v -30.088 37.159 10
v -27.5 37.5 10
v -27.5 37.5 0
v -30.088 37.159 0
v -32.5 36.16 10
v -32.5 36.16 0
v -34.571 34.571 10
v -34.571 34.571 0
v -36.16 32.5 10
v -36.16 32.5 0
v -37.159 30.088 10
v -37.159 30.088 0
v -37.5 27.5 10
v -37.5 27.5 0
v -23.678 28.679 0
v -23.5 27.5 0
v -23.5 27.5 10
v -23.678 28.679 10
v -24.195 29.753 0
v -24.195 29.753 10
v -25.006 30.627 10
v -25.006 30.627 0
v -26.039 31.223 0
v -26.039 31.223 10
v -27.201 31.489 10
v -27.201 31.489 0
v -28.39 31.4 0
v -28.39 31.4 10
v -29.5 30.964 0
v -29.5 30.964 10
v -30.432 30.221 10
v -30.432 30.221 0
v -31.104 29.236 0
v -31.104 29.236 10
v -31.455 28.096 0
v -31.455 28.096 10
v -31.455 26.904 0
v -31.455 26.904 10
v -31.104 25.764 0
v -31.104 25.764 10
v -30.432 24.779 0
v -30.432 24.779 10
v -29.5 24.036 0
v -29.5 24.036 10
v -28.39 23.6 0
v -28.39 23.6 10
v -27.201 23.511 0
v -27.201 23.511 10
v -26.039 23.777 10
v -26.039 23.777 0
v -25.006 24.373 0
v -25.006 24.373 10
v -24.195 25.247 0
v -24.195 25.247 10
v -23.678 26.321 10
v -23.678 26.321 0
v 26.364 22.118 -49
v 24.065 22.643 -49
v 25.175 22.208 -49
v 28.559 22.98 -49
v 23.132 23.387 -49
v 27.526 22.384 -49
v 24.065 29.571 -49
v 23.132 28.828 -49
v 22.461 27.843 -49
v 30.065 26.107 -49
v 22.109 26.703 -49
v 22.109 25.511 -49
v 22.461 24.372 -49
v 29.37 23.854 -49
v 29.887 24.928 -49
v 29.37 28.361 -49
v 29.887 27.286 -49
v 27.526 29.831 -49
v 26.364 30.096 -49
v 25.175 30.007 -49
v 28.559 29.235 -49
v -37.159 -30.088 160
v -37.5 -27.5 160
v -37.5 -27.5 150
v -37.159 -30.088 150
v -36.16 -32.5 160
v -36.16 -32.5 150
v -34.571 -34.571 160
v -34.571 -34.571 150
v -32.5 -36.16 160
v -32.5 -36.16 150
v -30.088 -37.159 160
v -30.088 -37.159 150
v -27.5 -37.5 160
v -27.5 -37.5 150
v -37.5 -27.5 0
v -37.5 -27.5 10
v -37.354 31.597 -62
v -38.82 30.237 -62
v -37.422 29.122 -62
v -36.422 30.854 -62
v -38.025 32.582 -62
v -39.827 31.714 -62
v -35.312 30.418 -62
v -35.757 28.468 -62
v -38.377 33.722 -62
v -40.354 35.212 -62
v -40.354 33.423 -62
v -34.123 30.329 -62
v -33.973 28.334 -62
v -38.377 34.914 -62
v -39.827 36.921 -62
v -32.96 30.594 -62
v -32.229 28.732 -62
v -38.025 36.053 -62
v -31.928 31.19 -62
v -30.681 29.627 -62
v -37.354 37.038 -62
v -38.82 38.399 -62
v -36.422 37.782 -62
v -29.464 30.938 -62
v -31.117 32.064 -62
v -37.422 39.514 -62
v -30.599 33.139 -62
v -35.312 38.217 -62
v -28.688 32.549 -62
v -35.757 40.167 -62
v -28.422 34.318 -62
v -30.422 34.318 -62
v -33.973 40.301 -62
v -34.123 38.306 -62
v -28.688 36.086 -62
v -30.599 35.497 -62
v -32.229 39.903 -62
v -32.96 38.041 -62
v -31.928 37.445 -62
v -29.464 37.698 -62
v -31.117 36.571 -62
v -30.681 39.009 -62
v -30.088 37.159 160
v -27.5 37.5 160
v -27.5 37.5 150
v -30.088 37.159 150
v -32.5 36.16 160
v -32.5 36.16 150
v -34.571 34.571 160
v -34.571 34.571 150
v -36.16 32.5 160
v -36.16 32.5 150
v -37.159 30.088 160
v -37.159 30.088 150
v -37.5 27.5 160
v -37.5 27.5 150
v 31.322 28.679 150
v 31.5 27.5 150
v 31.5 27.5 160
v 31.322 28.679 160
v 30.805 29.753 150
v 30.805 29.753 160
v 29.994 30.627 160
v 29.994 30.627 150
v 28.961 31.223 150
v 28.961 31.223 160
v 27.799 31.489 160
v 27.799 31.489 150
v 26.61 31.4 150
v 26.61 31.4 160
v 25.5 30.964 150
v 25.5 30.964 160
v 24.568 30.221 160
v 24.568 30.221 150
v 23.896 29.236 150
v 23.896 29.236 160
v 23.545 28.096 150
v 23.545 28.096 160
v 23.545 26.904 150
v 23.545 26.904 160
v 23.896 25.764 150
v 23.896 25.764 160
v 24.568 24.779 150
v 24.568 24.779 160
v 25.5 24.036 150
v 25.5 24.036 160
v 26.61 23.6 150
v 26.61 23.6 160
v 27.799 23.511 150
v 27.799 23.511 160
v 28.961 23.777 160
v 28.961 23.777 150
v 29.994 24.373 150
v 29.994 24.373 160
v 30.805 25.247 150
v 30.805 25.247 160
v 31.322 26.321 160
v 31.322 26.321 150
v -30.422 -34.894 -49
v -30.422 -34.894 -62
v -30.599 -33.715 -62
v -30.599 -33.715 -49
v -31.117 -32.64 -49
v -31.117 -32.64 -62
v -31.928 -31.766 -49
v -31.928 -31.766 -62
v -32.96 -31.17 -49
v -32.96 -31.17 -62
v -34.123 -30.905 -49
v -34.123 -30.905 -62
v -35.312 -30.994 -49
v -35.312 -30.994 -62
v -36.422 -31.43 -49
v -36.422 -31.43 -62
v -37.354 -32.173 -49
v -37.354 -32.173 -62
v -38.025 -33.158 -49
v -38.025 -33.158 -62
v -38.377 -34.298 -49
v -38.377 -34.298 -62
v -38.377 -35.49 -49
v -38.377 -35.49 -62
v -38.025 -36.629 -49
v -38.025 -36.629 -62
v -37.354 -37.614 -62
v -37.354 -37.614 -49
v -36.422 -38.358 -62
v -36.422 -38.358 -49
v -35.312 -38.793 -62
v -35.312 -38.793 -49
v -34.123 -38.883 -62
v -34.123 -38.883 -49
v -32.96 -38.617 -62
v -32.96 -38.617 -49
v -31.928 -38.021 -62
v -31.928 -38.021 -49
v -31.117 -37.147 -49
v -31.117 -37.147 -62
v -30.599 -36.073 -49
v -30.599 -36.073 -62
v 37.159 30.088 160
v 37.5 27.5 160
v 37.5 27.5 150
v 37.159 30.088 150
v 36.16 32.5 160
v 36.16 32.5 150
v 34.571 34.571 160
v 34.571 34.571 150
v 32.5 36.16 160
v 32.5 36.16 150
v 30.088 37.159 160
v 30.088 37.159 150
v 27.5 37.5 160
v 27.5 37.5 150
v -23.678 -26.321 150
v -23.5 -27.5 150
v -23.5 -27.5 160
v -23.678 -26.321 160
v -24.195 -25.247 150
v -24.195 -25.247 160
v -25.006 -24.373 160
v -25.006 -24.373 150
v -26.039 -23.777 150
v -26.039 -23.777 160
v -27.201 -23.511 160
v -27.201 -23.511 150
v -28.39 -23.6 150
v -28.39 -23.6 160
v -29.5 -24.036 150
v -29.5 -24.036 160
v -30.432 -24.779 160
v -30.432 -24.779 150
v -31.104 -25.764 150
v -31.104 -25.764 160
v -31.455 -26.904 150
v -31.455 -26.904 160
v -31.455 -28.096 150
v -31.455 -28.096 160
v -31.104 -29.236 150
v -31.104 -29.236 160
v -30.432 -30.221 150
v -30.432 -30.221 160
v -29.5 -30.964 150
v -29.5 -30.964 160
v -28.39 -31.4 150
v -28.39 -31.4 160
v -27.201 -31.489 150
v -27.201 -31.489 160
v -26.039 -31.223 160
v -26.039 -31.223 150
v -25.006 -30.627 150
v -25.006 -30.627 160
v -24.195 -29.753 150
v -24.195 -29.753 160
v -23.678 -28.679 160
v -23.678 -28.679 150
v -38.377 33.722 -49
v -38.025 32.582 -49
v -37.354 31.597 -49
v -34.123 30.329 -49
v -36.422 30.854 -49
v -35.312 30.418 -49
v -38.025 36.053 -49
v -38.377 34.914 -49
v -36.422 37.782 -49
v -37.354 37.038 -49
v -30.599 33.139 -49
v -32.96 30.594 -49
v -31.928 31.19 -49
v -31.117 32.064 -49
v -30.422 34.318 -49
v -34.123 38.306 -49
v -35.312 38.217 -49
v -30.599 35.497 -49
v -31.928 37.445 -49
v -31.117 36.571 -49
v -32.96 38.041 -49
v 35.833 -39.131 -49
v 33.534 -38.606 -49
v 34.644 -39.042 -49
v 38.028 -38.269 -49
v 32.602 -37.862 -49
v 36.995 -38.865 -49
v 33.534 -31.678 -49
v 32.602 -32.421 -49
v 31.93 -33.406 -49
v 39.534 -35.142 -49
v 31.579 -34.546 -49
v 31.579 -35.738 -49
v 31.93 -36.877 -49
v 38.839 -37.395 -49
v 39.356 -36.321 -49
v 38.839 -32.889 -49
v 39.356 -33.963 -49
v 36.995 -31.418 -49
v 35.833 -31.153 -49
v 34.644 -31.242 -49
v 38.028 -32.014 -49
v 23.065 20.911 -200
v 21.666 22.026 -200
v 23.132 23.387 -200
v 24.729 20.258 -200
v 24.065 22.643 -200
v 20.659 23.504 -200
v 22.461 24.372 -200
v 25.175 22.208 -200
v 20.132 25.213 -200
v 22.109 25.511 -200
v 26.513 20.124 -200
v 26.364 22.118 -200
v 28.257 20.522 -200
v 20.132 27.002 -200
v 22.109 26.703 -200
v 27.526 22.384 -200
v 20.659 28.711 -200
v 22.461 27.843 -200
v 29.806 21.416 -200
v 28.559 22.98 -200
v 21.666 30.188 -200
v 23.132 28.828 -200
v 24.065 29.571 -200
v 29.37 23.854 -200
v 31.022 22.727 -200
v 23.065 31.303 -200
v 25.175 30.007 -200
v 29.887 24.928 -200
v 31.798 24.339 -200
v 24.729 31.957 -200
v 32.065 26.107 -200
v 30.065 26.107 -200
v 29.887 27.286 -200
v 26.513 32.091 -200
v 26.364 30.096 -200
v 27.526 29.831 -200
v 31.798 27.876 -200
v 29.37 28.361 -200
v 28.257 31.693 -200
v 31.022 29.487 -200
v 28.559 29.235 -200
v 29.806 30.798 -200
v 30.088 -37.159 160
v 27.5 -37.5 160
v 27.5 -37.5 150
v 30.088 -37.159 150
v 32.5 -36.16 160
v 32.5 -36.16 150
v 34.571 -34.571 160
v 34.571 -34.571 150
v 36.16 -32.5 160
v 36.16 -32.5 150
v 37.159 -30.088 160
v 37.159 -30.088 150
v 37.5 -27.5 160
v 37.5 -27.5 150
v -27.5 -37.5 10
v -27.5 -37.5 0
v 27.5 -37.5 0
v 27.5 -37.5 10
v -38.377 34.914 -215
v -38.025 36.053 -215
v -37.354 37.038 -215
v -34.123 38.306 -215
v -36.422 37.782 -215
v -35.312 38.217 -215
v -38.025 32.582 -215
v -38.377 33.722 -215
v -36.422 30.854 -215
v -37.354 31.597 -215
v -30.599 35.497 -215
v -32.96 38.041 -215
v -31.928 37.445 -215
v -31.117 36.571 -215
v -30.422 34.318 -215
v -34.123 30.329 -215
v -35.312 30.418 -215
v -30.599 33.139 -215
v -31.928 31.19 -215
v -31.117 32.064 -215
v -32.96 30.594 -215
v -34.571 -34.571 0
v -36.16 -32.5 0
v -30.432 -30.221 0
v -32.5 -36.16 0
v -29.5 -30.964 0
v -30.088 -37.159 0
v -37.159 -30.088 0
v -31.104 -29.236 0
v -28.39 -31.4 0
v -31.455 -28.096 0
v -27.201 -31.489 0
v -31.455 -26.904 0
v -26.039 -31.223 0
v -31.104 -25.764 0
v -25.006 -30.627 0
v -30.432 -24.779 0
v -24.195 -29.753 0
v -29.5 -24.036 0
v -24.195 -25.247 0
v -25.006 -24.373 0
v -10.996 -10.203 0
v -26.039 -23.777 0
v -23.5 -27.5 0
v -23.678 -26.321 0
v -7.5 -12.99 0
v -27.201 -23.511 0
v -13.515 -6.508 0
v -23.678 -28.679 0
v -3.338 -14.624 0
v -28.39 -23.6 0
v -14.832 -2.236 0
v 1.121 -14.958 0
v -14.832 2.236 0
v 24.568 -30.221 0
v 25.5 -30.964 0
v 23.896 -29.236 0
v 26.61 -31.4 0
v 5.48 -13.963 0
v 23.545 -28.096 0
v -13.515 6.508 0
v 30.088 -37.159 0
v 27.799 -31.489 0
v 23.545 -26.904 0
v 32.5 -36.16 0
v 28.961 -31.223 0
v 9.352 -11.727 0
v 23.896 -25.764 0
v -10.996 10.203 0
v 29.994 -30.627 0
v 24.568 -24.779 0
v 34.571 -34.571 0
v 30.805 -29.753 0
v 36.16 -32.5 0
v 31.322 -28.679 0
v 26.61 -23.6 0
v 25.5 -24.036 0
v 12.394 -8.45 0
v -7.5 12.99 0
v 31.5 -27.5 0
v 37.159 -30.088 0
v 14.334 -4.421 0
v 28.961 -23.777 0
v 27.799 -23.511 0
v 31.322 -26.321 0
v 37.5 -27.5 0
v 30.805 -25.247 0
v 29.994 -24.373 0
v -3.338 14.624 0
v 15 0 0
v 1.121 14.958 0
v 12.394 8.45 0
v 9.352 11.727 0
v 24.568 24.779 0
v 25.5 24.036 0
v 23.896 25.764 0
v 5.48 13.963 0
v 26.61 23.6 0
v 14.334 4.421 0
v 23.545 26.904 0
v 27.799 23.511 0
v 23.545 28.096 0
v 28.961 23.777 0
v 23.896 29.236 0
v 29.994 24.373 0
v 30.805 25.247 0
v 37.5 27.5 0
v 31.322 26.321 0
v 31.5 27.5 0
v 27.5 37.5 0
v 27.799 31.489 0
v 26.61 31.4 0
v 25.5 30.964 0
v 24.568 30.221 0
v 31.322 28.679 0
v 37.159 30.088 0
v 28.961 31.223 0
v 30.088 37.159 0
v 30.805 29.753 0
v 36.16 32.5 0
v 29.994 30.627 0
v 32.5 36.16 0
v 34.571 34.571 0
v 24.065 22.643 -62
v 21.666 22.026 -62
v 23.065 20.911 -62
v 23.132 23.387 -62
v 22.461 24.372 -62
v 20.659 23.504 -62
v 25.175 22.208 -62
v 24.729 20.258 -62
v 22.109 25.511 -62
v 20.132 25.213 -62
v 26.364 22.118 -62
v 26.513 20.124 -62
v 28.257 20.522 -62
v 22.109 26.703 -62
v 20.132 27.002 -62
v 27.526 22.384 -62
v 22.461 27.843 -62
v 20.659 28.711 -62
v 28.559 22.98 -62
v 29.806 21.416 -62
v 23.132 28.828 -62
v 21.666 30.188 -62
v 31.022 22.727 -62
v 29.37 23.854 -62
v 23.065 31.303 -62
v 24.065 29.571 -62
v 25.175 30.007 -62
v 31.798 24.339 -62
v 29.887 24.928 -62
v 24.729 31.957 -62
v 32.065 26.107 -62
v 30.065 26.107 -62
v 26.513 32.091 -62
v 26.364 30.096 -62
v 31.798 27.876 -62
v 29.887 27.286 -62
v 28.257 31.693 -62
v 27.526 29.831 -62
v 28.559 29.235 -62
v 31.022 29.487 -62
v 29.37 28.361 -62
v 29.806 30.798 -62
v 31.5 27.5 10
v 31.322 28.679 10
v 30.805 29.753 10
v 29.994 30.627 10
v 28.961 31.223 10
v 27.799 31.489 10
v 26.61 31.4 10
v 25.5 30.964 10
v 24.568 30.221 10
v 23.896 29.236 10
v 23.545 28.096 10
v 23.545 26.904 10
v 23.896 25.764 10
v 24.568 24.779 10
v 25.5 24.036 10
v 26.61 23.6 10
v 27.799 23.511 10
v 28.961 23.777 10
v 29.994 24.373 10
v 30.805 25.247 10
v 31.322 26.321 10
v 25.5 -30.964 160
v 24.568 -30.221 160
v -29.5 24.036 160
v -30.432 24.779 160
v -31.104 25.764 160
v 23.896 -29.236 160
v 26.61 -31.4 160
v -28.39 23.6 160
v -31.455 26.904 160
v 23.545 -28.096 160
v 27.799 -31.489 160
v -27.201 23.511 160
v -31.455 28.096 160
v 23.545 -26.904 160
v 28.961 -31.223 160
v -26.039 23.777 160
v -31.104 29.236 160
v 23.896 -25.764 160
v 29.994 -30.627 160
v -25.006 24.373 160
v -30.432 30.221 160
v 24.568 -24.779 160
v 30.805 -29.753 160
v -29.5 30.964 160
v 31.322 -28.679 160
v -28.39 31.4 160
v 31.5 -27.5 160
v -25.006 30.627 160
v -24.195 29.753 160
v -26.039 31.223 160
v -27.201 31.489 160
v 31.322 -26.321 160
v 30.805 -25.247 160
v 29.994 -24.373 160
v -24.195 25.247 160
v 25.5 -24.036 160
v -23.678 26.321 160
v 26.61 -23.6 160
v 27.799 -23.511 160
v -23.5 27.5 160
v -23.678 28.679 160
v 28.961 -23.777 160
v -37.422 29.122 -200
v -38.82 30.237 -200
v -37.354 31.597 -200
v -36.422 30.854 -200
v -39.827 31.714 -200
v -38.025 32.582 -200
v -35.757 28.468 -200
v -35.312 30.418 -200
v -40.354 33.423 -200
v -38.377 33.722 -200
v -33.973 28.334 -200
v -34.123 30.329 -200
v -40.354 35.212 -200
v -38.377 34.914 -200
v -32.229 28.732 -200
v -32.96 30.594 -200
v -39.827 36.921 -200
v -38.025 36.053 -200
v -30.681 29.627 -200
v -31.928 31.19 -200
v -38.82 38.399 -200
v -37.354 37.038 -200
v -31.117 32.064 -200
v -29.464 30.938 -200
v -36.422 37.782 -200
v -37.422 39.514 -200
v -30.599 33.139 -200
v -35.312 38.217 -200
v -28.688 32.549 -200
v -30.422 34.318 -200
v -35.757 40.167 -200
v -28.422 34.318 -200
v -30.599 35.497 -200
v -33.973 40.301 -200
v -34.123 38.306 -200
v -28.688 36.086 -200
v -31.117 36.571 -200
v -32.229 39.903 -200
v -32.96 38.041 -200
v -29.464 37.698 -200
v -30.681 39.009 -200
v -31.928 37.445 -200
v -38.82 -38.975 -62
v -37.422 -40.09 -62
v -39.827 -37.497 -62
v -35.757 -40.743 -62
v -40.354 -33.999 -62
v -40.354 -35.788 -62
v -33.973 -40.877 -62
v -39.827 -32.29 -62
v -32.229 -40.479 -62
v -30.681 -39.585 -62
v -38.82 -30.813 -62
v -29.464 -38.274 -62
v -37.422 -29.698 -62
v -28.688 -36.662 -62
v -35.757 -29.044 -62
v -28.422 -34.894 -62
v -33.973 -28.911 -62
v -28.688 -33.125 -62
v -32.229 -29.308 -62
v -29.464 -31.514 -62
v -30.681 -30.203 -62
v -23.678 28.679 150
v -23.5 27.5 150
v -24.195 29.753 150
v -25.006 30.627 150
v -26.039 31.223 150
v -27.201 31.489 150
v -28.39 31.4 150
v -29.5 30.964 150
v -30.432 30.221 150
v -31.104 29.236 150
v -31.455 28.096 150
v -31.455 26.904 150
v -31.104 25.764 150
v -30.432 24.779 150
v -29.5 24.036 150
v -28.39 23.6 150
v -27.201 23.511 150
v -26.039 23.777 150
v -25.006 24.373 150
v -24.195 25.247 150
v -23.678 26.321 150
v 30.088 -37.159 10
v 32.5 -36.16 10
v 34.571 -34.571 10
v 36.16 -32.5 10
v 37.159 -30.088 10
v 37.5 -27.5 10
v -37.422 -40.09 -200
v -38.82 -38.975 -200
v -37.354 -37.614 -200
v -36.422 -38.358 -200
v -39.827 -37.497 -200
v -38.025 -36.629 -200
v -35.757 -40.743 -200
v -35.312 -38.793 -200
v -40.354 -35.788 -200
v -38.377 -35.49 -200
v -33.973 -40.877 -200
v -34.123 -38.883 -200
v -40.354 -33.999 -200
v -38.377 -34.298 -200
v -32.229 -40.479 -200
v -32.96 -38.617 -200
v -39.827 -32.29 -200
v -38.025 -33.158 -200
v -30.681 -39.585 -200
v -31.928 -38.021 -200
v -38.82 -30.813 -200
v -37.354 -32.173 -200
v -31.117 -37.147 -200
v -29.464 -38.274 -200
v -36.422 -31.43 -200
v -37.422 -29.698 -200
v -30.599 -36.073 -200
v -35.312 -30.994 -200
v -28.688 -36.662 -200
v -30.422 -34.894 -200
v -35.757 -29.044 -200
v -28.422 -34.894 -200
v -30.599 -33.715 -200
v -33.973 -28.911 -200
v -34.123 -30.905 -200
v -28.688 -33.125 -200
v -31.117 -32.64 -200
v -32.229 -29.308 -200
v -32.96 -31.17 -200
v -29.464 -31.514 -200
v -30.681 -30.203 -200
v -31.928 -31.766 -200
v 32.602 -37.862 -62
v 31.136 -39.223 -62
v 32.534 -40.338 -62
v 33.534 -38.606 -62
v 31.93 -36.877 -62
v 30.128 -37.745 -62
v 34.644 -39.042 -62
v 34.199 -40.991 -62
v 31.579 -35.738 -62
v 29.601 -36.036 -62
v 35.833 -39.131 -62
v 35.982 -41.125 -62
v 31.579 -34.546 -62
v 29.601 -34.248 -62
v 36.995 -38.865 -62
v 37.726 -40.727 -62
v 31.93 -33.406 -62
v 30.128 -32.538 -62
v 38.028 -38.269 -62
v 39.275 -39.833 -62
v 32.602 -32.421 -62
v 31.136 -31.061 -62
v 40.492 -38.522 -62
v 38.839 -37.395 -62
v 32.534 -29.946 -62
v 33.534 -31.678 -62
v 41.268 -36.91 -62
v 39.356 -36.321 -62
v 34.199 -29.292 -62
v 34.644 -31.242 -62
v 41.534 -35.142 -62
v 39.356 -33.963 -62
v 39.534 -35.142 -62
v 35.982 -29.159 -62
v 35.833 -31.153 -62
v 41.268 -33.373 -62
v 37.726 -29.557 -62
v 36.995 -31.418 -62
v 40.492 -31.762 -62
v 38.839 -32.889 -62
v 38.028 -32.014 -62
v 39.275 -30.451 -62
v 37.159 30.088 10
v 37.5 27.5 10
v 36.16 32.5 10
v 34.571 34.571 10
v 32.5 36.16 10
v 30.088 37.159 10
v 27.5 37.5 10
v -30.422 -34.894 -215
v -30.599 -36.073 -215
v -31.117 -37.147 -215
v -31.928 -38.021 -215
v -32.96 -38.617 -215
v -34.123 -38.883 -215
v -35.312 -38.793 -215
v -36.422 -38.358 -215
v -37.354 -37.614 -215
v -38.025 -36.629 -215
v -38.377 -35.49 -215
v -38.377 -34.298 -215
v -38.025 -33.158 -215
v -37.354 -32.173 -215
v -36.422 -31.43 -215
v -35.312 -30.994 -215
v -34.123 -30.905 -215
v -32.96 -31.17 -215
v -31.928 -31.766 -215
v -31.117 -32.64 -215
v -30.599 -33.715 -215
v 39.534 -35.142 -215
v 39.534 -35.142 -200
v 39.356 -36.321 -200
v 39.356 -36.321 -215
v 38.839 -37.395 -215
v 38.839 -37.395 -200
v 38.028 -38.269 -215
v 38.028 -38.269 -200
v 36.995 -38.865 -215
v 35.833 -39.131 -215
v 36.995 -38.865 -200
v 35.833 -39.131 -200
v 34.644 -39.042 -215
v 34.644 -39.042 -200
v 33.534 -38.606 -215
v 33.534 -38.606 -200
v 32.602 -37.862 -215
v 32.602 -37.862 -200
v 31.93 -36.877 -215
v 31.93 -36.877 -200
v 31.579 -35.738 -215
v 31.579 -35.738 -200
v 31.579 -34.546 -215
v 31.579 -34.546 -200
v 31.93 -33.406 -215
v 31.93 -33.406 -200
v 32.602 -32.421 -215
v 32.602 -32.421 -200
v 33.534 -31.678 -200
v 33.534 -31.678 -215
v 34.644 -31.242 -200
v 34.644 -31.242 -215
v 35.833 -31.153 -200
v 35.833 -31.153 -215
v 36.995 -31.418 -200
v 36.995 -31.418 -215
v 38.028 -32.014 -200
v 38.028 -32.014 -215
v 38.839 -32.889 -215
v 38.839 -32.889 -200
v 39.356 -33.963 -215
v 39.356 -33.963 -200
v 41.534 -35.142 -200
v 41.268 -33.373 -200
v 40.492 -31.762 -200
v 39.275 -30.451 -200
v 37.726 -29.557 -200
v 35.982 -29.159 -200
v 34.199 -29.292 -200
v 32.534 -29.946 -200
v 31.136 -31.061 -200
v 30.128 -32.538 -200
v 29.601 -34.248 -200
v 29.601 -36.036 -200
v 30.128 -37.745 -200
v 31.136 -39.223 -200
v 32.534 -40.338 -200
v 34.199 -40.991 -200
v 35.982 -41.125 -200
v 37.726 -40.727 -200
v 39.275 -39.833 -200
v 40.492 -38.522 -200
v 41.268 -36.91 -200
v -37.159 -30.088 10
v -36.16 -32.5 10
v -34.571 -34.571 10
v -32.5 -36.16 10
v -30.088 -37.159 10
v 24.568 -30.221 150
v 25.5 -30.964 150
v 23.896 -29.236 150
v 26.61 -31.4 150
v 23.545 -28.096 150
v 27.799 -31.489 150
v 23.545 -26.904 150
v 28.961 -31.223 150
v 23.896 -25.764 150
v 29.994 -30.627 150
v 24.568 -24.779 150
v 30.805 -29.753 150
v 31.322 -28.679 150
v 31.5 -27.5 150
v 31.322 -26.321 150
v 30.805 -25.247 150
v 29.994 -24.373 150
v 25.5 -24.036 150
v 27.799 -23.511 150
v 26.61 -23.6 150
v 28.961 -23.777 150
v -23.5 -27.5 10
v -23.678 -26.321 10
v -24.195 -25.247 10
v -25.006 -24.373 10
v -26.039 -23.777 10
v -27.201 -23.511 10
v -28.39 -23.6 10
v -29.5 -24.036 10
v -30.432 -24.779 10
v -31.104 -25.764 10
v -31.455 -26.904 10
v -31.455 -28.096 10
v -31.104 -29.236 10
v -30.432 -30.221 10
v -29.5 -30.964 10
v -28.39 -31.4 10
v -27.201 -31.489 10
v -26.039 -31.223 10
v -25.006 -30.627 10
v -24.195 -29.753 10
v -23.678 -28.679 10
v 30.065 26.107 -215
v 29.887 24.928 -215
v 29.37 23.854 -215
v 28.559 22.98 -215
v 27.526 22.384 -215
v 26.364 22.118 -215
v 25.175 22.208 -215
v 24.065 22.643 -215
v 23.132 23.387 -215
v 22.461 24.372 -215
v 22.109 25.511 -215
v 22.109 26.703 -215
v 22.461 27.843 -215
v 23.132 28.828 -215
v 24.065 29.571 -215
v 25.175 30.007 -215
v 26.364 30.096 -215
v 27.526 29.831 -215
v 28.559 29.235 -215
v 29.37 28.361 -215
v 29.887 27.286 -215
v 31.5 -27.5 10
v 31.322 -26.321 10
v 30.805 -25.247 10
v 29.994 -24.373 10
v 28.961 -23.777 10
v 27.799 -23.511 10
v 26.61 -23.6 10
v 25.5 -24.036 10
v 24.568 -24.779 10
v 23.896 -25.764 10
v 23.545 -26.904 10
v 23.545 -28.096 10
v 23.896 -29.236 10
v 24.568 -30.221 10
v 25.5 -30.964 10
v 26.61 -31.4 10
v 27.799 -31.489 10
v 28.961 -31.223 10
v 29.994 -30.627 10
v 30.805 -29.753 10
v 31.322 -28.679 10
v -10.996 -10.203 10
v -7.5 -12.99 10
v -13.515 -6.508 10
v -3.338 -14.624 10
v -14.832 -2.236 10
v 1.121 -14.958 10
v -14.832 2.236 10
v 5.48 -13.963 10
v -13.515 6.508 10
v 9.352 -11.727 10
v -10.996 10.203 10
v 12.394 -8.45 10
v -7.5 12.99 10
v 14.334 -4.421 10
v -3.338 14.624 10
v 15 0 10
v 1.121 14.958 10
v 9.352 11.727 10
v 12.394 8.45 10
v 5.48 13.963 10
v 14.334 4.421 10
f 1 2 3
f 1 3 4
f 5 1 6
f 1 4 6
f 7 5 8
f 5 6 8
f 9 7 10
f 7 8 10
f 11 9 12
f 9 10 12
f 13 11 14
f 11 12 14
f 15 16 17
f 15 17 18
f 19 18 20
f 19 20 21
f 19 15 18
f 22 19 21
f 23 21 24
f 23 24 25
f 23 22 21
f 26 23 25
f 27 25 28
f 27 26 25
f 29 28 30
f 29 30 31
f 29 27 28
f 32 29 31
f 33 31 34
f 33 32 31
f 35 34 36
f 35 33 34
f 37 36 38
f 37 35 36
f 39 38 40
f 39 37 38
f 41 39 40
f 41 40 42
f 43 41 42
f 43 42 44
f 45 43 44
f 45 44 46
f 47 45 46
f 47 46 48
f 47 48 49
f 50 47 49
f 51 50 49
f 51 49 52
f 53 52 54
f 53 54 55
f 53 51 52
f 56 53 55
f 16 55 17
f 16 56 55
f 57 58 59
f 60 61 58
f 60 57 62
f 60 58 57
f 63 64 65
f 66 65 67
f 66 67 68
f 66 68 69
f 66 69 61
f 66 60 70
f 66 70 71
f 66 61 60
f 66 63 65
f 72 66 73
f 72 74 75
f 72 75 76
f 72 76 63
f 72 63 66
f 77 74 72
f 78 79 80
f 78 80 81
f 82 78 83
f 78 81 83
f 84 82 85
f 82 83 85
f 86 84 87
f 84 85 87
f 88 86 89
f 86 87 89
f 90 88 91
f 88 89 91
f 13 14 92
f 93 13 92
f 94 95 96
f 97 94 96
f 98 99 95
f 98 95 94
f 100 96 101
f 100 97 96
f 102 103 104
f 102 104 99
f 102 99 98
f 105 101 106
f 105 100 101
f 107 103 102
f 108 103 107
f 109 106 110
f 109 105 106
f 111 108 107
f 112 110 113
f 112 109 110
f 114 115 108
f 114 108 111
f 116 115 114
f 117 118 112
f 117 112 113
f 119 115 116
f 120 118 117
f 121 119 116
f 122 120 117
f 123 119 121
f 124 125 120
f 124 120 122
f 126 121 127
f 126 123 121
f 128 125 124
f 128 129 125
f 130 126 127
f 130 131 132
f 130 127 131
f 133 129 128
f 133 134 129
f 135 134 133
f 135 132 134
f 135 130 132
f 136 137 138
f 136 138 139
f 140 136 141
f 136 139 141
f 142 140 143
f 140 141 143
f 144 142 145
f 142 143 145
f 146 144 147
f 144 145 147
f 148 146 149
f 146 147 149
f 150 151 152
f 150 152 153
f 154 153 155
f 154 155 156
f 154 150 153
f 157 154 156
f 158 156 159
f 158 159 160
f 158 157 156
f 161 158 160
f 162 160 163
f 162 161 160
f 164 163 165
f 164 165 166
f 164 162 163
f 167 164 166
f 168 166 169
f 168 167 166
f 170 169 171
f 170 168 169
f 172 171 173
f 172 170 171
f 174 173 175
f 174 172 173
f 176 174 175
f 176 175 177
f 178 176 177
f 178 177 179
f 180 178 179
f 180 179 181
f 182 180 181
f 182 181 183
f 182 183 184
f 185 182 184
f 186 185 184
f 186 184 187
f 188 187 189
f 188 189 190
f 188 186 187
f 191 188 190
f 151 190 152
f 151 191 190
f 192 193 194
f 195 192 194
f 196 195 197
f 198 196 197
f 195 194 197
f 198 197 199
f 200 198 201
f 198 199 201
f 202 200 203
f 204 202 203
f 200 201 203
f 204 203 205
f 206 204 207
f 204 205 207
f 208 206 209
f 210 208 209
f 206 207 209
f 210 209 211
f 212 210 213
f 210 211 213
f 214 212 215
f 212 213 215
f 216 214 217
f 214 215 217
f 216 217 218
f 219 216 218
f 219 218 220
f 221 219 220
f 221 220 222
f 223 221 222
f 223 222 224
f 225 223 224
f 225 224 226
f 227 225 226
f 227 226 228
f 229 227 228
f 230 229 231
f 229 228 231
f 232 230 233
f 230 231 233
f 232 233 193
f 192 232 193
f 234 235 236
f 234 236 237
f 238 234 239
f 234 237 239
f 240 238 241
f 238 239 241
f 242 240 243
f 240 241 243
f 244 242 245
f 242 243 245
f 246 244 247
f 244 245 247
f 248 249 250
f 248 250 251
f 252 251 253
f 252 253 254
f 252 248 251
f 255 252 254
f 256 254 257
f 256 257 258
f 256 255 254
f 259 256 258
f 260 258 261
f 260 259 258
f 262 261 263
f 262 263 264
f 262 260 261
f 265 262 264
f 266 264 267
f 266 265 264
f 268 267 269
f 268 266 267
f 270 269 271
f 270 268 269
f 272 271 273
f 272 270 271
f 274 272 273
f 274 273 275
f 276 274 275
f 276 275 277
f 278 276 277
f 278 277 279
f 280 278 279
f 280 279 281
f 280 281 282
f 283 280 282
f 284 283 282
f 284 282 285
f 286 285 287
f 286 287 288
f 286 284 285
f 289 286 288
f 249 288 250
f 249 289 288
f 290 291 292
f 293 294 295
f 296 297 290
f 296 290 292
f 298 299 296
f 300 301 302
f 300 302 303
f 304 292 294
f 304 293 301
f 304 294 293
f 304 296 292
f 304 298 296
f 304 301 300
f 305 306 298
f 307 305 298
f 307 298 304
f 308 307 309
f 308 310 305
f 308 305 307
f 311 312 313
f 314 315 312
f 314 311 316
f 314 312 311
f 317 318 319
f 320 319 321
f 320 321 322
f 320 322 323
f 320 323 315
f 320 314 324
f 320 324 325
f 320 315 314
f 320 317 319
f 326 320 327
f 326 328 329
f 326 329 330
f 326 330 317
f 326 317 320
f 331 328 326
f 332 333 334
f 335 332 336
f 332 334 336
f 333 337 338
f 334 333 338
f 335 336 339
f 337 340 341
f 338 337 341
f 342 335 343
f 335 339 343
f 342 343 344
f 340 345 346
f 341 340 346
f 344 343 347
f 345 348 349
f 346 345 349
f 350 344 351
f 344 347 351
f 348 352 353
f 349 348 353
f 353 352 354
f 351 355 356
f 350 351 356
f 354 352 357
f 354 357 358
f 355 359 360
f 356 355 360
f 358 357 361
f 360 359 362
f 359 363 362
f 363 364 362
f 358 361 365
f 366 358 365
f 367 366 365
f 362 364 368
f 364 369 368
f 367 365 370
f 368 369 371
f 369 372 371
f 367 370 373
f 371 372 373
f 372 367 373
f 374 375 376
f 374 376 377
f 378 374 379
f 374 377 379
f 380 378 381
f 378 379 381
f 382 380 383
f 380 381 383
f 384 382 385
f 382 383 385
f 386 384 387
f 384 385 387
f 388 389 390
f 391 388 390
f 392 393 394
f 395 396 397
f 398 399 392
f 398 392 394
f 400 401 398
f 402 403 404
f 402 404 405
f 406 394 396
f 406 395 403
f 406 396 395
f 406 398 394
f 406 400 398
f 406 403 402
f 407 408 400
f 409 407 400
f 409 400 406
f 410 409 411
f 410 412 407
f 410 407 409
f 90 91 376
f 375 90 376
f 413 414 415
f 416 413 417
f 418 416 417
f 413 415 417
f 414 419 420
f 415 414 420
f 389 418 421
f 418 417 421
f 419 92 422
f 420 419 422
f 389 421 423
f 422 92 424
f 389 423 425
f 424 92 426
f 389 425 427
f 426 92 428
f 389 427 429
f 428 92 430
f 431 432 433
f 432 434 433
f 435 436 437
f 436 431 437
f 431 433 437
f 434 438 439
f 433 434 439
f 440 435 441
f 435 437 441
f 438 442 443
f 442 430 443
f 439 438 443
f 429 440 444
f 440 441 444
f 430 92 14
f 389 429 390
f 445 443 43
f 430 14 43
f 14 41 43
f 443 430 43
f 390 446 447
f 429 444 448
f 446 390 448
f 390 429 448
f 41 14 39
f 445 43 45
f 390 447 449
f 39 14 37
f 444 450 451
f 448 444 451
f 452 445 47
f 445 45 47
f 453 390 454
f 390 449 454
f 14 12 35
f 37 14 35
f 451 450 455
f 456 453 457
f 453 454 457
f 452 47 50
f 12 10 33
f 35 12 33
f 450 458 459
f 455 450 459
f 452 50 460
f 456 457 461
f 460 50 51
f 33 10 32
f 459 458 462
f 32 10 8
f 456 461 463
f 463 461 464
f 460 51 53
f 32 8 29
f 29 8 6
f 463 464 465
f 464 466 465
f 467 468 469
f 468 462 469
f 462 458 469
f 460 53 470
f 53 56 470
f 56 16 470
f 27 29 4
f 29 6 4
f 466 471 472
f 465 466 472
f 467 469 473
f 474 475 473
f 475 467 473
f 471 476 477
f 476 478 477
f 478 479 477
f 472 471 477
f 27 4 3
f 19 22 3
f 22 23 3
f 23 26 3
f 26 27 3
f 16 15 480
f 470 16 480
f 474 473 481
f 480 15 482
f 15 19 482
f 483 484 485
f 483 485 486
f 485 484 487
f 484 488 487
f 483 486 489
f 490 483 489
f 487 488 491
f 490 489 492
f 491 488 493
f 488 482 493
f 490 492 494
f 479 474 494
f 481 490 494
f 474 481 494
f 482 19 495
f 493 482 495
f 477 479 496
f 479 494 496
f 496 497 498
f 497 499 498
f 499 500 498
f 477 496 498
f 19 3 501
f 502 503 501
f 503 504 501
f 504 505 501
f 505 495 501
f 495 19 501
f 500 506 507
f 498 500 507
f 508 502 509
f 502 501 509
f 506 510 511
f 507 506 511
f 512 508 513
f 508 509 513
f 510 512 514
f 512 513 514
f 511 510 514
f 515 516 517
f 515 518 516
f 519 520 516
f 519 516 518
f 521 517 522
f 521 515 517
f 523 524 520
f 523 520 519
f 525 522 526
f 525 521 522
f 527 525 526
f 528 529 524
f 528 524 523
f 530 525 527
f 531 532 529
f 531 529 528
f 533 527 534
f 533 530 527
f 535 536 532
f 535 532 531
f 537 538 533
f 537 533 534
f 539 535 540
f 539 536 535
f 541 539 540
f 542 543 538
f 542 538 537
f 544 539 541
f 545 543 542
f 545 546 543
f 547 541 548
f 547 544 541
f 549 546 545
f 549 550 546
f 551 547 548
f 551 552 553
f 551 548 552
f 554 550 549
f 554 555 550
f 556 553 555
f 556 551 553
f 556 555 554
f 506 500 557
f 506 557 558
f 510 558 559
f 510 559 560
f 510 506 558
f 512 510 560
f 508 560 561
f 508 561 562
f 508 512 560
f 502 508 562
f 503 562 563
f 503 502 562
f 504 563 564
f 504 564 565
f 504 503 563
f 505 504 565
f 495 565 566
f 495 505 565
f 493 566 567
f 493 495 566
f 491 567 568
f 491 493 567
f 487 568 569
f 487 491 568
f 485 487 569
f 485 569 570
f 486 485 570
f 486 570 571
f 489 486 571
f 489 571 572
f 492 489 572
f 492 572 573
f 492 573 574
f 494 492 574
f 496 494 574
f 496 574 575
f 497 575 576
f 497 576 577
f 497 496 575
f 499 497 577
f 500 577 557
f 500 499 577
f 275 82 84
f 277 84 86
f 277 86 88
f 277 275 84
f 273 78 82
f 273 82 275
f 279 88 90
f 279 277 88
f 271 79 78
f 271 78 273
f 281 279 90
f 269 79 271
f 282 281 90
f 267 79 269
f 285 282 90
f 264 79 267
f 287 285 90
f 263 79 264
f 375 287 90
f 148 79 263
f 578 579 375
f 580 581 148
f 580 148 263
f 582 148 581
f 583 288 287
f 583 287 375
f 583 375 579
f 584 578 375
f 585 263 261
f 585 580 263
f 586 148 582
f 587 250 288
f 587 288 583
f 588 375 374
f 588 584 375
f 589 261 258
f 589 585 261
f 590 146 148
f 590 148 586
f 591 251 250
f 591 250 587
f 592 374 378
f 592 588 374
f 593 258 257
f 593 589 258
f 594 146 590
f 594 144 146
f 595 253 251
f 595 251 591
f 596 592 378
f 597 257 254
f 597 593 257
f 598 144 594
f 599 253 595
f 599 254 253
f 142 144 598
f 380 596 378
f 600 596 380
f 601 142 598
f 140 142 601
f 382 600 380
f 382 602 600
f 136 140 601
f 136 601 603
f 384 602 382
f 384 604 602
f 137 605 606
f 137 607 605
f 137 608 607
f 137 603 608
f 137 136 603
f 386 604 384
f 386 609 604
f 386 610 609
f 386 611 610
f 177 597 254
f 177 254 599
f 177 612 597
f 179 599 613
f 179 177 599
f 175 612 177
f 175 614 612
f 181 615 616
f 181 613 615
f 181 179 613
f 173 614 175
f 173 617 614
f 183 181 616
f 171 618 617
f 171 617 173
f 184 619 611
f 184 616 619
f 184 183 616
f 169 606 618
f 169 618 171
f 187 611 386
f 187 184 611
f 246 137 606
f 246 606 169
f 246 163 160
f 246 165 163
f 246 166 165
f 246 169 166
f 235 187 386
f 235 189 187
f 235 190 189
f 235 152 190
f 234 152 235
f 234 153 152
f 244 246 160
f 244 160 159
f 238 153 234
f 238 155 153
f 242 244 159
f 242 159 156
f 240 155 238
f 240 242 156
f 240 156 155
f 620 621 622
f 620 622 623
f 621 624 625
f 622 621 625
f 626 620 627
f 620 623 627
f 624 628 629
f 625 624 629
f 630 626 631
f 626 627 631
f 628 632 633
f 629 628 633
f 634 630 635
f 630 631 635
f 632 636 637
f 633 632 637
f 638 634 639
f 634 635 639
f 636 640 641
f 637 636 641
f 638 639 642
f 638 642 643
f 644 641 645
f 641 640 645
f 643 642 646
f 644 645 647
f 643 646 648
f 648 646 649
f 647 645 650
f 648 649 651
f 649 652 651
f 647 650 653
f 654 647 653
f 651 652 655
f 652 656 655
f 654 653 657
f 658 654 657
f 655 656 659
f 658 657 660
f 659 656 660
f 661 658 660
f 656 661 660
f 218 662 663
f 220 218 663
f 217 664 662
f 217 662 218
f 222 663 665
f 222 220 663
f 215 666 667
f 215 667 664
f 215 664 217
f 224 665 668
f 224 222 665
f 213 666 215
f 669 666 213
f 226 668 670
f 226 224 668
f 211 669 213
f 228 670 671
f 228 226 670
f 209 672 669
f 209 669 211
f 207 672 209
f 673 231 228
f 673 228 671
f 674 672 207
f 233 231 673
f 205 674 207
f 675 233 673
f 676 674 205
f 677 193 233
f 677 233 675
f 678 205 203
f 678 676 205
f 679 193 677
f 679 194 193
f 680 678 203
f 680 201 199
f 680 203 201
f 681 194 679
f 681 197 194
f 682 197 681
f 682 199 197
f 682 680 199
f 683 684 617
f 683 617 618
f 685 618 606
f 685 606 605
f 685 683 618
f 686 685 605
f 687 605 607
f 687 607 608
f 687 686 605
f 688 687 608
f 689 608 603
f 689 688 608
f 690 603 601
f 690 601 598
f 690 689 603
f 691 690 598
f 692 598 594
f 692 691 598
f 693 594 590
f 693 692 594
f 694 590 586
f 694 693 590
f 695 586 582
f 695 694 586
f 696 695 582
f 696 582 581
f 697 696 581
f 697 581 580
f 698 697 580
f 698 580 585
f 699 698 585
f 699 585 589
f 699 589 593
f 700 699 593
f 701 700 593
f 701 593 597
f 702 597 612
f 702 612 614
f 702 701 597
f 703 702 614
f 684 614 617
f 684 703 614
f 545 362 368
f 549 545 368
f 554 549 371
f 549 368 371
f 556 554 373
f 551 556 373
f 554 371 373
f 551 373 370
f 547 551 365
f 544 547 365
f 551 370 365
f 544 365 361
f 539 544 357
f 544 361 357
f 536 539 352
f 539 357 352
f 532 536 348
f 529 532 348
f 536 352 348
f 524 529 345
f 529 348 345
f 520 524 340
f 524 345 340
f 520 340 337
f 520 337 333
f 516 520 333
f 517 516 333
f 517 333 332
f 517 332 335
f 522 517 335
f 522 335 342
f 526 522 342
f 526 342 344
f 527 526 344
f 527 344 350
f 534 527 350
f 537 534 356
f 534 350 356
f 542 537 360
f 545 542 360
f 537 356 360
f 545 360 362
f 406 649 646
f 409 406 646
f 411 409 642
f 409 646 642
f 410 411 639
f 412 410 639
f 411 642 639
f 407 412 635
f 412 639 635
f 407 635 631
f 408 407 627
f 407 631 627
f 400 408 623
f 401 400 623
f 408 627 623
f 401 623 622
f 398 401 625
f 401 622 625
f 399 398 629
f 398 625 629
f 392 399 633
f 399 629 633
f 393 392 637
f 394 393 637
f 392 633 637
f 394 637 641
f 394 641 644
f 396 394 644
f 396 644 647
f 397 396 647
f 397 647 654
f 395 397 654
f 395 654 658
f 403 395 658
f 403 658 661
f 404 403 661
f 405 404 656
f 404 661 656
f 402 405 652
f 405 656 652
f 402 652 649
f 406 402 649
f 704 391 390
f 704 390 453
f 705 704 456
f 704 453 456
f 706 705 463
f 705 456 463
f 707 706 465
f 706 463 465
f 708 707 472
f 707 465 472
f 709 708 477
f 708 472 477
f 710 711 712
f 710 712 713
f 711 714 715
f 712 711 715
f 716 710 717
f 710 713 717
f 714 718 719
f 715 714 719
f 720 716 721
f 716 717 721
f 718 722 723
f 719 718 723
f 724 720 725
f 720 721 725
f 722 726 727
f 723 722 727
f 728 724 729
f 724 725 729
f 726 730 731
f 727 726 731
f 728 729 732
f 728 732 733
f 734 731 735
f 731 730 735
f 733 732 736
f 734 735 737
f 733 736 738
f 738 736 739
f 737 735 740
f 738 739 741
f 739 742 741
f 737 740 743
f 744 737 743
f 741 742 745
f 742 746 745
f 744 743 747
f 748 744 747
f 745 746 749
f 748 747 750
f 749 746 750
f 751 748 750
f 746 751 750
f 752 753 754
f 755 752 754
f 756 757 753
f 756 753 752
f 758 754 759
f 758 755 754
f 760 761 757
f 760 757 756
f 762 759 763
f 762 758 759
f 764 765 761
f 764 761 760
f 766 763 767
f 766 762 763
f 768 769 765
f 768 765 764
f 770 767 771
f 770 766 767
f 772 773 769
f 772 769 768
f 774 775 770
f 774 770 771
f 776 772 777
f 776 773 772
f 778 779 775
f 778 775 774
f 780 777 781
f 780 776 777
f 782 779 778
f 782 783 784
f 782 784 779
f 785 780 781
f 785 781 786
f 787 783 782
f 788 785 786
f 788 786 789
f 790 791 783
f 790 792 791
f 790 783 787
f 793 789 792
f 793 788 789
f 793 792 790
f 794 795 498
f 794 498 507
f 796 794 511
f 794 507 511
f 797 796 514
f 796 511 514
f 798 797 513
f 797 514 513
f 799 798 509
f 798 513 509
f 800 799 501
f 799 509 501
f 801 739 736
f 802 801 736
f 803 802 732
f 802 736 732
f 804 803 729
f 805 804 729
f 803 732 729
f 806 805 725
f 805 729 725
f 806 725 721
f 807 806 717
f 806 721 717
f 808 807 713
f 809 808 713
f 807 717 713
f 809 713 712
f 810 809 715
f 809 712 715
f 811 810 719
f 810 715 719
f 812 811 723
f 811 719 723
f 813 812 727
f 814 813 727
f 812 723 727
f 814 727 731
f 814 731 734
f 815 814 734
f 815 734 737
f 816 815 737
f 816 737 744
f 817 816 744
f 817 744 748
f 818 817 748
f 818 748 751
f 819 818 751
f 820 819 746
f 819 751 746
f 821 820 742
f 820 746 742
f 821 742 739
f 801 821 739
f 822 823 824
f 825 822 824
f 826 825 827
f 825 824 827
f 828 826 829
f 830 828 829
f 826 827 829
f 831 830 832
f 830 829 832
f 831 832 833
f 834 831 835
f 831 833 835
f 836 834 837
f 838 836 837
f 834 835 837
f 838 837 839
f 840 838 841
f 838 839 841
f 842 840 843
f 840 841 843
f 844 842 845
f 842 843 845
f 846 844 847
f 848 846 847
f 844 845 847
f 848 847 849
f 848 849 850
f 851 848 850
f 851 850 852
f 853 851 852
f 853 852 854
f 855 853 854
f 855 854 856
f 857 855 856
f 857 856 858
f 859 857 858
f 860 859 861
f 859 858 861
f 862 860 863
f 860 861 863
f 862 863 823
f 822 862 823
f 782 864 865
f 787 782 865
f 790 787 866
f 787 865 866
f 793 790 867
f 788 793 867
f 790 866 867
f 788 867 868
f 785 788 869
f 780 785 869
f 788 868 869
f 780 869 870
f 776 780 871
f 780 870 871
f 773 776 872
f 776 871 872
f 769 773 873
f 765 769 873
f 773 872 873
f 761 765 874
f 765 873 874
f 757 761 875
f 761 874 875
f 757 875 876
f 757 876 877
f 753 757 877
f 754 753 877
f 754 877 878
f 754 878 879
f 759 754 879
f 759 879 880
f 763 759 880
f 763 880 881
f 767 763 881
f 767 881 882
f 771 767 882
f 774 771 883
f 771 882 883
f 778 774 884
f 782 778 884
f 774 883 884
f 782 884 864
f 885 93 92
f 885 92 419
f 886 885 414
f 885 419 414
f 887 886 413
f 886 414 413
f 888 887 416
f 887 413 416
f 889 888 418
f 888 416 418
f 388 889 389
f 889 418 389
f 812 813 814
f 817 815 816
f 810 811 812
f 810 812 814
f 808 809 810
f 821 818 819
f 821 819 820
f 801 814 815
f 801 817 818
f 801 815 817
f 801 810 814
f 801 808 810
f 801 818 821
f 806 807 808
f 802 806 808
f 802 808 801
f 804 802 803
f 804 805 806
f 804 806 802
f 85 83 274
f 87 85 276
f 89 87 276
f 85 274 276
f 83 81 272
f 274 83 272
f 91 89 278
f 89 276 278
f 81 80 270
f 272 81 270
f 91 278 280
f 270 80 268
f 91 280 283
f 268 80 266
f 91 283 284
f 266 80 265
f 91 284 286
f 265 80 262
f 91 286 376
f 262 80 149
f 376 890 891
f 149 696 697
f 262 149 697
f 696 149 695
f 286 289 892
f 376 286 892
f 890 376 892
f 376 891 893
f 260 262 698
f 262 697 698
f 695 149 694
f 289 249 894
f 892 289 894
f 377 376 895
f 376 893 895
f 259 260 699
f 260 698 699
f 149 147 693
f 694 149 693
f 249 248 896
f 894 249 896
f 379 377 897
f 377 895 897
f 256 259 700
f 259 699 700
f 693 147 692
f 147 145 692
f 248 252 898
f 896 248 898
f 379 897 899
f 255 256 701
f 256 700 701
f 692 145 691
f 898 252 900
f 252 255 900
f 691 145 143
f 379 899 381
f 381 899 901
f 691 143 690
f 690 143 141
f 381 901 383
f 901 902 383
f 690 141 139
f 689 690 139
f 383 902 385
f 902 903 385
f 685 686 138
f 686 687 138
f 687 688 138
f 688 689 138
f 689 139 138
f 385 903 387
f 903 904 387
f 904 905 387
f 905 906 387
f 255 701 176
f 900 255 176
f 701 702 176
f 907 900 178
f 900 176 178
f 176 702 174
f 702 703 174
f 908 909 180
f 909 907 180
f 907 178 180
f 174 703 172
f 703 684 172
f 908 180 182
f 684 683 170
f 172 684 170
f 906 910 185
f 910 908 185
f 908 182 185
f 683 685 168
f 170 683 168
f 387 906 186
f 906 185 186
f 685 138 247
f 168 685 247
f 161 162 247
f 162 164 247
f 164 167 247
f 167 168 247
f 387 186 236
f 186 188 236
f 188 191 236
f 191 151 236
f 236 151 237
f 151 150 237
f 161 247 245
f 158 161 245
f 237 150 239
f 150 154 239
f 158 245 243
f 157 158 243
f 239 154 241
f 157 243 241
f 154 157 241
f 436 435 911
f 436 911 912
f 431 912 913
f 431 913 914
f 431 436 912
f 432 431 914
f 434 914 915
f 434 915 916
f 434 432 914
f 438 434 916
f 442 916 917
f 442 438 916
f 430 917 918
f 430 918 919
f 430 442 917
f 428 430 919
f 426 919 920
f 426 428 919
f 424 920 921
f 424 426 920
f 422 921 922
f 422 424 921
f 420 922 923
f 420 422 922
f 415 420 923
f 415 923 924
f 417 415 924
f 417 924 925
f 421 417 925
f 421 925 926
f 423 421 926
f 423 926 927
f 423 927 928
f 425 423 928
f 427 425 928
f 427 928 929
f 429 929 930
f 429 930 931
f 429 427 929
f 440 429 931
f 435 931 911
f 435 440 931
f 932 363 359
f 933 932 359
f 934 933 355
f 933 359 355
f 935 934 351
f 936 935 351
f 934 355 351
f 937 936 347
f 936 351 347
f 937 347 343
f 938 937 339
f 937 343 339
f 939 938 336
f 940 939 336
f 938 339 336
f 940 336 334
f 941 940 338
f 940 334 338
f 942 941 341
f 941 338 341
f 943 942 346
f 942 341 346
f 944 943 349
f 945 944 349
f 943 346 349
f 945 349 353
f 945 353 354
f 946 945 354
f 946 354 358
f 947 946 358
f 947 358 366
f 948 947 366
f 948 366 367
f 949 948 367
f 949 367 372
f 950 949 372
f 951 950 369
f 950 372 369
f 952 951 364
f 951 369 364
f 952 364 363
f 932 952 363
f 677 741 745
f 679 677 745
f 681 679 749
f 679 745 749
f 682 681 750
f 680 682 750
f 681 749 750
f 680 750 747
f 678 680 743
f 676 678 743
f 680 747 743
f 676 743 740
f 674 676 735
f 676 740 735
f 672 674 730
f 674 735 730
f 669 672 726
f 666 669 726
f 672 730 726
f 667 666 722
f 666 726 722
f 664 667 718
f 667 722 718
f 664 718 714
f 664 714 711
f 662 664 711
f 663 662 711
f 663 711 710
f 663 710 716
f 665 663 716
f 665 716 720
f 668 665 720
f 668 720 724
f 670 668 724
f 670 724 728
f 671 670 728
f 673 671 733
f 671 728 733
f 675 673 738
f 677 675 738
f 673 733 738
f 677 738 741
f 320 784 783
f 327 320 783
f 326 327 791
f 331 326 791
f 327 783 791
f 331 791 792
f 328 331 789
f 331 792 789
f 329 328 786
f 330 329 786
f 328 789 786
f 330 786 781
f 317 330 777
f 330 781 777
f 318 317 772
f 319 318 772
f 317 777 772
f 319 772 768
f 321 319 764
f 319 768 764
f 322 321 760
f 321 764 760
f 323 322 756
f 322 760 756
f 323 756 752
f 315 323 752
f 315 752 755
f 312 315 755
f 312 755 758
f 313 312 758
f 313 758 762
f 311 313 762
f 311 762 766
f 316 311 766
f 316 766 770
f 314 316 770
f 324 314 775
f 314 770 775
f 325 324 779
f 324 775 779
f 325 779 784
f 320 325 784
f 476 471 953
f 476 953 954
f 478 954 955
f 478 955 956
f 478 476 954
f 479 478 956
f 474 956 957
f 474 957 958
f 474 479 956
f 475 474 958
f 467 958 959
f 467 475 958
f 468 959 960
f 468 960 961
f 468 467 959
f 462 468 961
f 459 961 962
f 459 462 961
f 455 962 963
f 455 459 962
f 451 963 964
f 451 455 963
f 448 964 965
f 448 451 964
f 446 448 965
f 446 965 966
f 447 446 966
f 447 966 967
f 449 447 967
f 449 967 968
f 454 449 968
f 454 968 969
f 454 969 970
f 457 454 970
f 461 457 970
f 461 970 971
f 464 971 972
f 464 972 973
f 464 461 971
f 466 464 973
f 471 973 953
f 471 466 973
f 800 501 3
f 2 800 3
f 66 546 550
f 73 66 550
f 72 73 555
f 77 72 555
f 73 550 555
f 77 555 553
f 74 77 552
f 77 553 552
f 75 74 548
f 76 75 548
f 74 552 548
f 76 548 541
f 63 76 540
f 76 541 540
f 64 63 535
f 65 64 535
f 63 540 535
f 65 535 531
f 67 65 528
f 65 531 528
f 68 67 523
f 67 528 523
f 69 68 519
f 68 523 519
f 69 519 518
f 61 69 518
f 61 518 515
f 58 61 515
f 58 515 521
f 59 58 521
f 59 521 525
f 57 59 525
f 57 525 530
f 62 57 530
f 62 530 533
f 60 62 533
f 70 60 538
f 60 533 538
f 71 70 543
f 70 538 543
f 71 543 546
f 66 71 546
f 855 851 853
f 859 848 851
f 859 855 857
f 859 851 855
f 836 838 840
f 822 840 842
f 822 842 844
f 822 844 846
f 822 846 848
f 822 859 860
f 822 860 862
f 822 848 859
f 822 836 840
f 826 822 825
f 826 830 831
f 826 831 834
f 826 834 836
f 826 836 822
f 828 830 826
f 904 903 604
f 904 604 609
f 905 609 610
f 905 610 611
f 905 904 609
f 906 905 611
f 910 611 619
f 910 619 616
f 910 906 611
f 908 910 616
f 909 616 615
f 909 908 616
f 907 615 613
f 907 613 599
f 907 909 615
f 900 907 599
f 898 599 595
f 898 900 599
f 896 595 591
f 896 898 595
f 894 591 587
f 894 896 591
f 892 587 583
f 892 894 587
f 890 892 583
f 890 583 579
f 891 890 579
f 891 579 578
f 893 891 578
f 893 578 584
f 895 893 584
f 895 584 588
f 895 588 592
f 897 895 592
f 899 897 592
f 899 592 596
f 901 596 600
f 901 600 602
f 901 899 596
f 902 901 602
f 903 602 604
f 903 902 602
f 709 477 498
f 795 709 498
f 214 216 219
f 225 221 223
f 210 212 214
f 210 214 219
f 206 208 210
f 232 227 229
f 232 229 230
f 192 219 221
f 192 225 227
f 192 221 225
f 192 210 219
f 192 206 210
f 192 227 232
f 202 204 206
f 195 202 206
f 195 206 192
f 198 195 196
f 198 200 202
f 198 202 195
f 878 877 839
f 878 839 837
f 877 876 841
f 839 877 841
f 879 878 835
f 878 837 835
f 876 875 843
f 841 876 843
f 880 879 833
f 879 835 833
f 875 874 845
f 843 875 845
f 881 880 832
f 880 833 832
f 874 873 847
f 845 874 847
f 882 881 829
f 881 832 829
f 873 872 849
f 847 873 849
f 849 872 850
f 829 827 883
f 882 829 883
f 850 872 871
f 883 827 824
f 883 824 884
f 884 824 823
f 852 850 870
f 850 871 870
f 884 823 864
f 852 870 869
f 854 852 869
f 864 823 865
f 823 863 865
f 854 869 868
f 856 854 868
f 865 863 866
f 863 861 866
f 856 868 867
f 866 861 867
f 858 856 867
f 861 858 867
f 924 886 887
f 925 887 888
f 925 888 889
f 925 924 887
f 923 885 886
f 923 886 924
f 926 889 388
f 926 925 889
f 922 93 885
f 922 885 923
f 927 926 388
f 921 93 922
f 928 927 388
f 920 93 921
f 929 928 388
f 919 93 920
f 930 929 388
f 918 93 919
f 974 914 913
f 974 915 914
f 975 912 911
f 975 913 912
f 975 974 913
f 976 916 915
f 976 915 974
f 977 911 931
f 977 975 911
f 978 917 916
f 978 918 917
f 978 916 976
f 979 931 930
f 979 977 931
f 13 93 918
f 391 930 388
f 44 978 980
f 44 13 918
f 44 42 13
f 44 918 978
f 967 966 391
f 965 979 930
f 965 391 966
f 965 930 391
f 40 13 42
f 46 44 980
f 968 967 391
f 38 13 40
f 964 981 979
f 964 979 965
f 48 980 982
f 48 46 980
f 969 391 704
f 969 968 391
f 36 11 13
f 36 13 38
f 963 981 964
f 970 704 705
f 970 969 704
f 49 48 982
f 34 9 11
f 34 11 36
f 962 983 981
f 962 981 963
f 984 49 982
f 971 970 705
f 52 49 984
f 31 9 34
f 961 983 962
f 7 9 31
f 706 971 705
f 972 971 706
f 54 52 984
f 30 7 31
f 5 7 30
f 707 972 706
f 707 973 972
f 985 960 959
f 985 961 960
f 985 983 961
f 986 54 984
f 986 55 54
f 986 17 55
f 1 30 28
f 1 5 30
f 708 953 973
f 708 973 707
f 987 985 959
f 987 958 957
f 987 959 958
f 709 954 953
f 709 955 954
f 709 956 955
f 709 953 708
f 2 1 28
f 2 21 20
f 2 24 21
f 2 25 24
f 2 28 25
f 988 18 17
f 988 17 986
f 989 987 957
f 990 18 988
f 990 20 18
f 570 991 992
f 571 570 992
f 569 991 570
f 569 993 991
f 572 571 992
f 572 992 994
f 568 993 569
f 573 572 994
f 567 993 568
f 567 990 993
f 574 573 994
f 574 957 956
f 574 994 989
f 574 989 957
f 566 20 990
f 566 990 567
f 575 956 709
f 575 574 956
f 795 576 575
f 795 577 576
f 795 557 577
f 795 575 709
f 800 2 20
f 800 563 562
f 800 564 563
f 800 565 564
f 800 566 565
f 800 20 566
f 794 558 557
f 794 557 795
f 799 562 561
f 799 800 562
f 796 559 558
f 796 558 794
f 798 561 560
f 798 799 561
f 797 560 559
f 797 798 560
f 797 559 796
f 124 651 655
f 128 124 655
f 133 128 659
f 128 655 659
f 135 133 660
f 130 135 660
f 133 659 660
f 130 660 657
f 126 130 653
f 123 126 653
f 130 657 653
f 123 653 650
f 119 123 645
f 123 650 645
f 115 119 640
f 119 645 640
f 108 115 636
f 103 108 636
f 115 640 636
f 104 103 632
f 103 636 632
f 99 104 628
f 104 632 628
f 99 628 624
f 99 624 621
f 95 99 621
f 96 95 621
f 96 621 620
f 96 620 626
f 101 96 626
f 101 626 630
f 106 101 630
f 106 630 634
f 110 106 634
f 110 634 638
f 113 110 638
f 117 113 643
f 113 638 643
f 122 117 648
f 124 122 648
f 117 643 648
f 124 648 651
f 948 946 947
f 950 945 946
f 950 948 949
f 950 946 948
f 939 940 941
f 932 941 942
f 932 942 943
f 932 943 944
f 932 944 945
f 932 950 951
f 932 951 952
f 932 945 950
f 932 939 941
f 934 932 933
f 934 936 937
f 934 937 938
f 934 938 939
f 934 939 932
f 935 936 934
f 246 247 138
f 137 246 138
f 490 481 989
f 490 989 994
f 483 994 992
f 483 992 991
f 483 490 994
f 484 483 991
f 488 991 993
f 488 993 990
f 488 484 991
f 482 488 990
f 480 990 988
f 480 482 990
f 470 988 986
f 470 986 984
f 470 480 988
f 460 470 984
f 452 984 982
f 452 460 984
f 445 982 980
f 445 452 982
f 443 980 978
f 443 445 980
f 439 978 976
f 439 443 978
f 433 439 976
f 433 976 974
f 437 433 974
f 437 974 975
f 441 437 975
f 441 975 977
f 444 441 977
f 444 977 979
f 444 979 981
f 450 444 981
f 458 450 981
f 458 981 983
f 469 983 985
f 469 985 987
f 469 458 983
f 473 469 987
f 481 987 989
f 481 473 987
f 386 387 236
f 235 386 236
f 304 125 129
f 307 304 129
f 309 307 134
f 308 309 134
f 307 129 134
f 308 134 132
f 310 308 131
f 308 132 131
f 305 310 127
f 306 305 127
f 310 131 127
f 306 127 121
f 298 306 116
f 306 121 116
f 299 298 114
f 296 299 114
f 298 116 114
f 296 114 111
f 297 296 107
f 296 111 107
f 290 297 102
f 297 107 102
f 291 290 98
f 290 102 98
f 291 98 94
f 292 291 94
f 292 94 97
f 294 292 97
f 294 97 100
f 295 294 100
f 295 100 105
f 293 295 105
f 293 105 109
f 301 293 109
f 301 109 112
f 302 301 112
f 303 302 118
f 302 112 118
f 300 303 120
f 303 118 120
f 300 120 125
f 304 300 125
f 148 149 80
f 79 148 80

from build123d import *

# Parameters (mm, degrees)
F0_R      = 4
F0_R_2    = 15
F1_DEPTH  = 10
F3_R      = 4
F4_DEPTH  = 10
F6_R      = 6
F7_DEPTH  = 138
F8_R      = 4
F9_DEPTH  = 15
F10_R     = 4
F11_DEPTH = 15
F12_R     = 4
F13_DEPTH = 15
F14_R     = 4
F15_DEPTH = 15
F16_R     = 4
F17_DEPTH = 13
F18_R     = 4
F19_DEPTH = 13
F20_R     = 4
F21_DEPTH = 13
F22_R     = 4
F23_DEPTH = 13


with BuildPart() as f1:
    # F0 (on Top) → F1 (new body)
    with BuildSketch(Plane.XY):
        with BuildLine():
            Line((-27.5, -37.5), (27.5, -37.5))
            ThreePointArc((27.5, -37.5), (34.571068, -34.571068), (37.5, -27.5))
            Line((37.5, -27.5), (37.5, 27.5))
            ThreePointArc((37.5, 27.5), (34.571068, 34.571068), (27.5, 37.5))
            Line((27.5, 37.5), (-27.5, 37.5))
            ThreePointArc((-27.5, 37.5), (-34.571068, 34.571068), (-37.5, 27.5))
            Line((-37.5, 27.5), (-37.5, -27.5))
            ThreePointArc((-37.5, -27.5), (-34.571068, -34.571068), (-27.5, -37.5))
        make_face()
        with Locations((-27.5, -27.5)):
            Circle(F0_R, mode=Mode.SUBTRACT)
        with Locations((27.5, -27.5)):
            Circle(F0_R, mode=Mode.SUBTRACT)
        with Locations((-27.5, 27.5)):
            Circle(F0_R, mode=Mode.SUBTRACT)
        Circle(F0_R_2, mode=Mode.SUBTRACT)
        with Locations((27.5, 27.5)):
            Circle(F0_R, mode=Mode.SUBTRACT)
    extrude(amount=F1_DEPTH)


with BuildPart() as f4:
    # F3 (on offset) → F4 (new body)
    with BuildSketch(Plane.XY.offset(150)):
        with BuildLine():
            ThreePointArc((-37.5, -27.5), (-34.571068, -34.571068), (-27.5, -37.5))
            Line((-27.5, -37.5), (27.5, -37.5))
            ThreePointArc((27.5, -37.5), (34.571068, -34.571068), (37.5, -27.5))
            Line((37.5, -27.5), (37.5, 27.5))
            ThreePointArc((37.5, 27.5), (34.571068, 34.571068), (27.5, 37.5))
            Line((27.5, 37.5), (-27.5, 37.5))
            ThreePointArc((-27.5, 37.5), (-34.571068, 34.571068), (-37.5, 27.5))
            Line((-37.5, 27.5), (-37.5, -27.5))
        make_face()
        with Locations((-27.5, -27.5)):
            Circle(F3_R, mode=Mode.SUBTRACT)
        with Locations((27.5, -27.5)):
            Circle(F3_R, mode=Mode.SUBTRACT)
        with Locations((-27.5, 27.5)):
            Circle(F3_R, mode=Mode.SUBTRACT)
        with Locations((27.5, 27.5)):
            Circle(F3_R, mode=Mode.SUBTRACT)
    extrude(amount=F4_DEPTH)


with BuildPart() as f7:
    # F6 (on offset) → F7 (new body)
    with BuildSketch(Plane.XY.offset(-200)):
        with Locations((35.534116, -35.141796)):
            Circle(F6_R)
        with Locations((26.064606, 26.107289)):
            Circle(F6_R)
        with Locations((-34.421506, 34.317683)):
            Circle(F6_R)
        with Locations((-34.421506, -34.893726)):
            Circle(F6_R)
    extrude(amount=F7_DEPTH)

    # F8 (on face) → F9 (join)
    with BuildSketch(Plane(origin=(0, 0, -200), x_dir=(1, 0, 0), z_dir=(0, 0, -1))):
        with Locations((35.534116, 35.141796)):
            Circle(F8_R)
    extrude(amount=F9_DEPTH)

    # F10 (on face) → F11 (join)
    with BuildSketch(Plane(origin=(0, 0, -200), x_dir=(1, 0, 0), z_dir=(0, 0, -1))):
        with Locations((26.064606, -26.107289)):
            Circle(F10_R)
    extrude(amount=F11_DEPTH)

    # F12 (on face) → F13 (join)
    with BuildSketch(Plane(origin=(0, 0, -200), x_dir=(1, 0, 0), z_dir=(0, 0, -1))):
        with Locations((-34.421506, 34.893726)):
            Circle(F12_R)
    extrude(amount=F13_DEPTH)

    # F14 (on face) → F15 (join)
    with BuildSketch(Plane(origin=(0, 0, -200), x_dir=(1, 0, 0), z_dir=(0, 0, -1))):
        with Locations((-34.421506, -34.317683)):
            Circle(F14_R)
    extrude(amount=F15_DEPTH)

    # F16 (on face) → F17 (join)
    with BuildSketch(Plane.XY.offset(-62)):
        with Locations((26.064606, 26.107289)):
            Circle(F16_R)
    extrude(amount=F17_DEPTH)

    # F18 (on face) → F19 (join)
    with BuildSketch(Plane.XY.offset(-62)):
        with Locations((35.534116, -35.141796)):
            Circle(F18_R)
    extrude(amount=F19_DEPTH)

    # F20 (on face) → F21 (join)
    with BuildSketch(Plane.XY.offset(-62)):
        with Locations((-34.421506, -34.893726)):
            Circle(F20_R)
    extrude(amount=F21_DEPTH)

    # F22 (on face) → F23 (join)
    with BuildSketch(Plane.XY.offset(-62)):
        with Locations((-34.421506, 34.317683)):
            Circle(F22_R)
    extrude(amount=F23_DEPTH)


solid = Compound([f1.part, f4.part, f7.part])
